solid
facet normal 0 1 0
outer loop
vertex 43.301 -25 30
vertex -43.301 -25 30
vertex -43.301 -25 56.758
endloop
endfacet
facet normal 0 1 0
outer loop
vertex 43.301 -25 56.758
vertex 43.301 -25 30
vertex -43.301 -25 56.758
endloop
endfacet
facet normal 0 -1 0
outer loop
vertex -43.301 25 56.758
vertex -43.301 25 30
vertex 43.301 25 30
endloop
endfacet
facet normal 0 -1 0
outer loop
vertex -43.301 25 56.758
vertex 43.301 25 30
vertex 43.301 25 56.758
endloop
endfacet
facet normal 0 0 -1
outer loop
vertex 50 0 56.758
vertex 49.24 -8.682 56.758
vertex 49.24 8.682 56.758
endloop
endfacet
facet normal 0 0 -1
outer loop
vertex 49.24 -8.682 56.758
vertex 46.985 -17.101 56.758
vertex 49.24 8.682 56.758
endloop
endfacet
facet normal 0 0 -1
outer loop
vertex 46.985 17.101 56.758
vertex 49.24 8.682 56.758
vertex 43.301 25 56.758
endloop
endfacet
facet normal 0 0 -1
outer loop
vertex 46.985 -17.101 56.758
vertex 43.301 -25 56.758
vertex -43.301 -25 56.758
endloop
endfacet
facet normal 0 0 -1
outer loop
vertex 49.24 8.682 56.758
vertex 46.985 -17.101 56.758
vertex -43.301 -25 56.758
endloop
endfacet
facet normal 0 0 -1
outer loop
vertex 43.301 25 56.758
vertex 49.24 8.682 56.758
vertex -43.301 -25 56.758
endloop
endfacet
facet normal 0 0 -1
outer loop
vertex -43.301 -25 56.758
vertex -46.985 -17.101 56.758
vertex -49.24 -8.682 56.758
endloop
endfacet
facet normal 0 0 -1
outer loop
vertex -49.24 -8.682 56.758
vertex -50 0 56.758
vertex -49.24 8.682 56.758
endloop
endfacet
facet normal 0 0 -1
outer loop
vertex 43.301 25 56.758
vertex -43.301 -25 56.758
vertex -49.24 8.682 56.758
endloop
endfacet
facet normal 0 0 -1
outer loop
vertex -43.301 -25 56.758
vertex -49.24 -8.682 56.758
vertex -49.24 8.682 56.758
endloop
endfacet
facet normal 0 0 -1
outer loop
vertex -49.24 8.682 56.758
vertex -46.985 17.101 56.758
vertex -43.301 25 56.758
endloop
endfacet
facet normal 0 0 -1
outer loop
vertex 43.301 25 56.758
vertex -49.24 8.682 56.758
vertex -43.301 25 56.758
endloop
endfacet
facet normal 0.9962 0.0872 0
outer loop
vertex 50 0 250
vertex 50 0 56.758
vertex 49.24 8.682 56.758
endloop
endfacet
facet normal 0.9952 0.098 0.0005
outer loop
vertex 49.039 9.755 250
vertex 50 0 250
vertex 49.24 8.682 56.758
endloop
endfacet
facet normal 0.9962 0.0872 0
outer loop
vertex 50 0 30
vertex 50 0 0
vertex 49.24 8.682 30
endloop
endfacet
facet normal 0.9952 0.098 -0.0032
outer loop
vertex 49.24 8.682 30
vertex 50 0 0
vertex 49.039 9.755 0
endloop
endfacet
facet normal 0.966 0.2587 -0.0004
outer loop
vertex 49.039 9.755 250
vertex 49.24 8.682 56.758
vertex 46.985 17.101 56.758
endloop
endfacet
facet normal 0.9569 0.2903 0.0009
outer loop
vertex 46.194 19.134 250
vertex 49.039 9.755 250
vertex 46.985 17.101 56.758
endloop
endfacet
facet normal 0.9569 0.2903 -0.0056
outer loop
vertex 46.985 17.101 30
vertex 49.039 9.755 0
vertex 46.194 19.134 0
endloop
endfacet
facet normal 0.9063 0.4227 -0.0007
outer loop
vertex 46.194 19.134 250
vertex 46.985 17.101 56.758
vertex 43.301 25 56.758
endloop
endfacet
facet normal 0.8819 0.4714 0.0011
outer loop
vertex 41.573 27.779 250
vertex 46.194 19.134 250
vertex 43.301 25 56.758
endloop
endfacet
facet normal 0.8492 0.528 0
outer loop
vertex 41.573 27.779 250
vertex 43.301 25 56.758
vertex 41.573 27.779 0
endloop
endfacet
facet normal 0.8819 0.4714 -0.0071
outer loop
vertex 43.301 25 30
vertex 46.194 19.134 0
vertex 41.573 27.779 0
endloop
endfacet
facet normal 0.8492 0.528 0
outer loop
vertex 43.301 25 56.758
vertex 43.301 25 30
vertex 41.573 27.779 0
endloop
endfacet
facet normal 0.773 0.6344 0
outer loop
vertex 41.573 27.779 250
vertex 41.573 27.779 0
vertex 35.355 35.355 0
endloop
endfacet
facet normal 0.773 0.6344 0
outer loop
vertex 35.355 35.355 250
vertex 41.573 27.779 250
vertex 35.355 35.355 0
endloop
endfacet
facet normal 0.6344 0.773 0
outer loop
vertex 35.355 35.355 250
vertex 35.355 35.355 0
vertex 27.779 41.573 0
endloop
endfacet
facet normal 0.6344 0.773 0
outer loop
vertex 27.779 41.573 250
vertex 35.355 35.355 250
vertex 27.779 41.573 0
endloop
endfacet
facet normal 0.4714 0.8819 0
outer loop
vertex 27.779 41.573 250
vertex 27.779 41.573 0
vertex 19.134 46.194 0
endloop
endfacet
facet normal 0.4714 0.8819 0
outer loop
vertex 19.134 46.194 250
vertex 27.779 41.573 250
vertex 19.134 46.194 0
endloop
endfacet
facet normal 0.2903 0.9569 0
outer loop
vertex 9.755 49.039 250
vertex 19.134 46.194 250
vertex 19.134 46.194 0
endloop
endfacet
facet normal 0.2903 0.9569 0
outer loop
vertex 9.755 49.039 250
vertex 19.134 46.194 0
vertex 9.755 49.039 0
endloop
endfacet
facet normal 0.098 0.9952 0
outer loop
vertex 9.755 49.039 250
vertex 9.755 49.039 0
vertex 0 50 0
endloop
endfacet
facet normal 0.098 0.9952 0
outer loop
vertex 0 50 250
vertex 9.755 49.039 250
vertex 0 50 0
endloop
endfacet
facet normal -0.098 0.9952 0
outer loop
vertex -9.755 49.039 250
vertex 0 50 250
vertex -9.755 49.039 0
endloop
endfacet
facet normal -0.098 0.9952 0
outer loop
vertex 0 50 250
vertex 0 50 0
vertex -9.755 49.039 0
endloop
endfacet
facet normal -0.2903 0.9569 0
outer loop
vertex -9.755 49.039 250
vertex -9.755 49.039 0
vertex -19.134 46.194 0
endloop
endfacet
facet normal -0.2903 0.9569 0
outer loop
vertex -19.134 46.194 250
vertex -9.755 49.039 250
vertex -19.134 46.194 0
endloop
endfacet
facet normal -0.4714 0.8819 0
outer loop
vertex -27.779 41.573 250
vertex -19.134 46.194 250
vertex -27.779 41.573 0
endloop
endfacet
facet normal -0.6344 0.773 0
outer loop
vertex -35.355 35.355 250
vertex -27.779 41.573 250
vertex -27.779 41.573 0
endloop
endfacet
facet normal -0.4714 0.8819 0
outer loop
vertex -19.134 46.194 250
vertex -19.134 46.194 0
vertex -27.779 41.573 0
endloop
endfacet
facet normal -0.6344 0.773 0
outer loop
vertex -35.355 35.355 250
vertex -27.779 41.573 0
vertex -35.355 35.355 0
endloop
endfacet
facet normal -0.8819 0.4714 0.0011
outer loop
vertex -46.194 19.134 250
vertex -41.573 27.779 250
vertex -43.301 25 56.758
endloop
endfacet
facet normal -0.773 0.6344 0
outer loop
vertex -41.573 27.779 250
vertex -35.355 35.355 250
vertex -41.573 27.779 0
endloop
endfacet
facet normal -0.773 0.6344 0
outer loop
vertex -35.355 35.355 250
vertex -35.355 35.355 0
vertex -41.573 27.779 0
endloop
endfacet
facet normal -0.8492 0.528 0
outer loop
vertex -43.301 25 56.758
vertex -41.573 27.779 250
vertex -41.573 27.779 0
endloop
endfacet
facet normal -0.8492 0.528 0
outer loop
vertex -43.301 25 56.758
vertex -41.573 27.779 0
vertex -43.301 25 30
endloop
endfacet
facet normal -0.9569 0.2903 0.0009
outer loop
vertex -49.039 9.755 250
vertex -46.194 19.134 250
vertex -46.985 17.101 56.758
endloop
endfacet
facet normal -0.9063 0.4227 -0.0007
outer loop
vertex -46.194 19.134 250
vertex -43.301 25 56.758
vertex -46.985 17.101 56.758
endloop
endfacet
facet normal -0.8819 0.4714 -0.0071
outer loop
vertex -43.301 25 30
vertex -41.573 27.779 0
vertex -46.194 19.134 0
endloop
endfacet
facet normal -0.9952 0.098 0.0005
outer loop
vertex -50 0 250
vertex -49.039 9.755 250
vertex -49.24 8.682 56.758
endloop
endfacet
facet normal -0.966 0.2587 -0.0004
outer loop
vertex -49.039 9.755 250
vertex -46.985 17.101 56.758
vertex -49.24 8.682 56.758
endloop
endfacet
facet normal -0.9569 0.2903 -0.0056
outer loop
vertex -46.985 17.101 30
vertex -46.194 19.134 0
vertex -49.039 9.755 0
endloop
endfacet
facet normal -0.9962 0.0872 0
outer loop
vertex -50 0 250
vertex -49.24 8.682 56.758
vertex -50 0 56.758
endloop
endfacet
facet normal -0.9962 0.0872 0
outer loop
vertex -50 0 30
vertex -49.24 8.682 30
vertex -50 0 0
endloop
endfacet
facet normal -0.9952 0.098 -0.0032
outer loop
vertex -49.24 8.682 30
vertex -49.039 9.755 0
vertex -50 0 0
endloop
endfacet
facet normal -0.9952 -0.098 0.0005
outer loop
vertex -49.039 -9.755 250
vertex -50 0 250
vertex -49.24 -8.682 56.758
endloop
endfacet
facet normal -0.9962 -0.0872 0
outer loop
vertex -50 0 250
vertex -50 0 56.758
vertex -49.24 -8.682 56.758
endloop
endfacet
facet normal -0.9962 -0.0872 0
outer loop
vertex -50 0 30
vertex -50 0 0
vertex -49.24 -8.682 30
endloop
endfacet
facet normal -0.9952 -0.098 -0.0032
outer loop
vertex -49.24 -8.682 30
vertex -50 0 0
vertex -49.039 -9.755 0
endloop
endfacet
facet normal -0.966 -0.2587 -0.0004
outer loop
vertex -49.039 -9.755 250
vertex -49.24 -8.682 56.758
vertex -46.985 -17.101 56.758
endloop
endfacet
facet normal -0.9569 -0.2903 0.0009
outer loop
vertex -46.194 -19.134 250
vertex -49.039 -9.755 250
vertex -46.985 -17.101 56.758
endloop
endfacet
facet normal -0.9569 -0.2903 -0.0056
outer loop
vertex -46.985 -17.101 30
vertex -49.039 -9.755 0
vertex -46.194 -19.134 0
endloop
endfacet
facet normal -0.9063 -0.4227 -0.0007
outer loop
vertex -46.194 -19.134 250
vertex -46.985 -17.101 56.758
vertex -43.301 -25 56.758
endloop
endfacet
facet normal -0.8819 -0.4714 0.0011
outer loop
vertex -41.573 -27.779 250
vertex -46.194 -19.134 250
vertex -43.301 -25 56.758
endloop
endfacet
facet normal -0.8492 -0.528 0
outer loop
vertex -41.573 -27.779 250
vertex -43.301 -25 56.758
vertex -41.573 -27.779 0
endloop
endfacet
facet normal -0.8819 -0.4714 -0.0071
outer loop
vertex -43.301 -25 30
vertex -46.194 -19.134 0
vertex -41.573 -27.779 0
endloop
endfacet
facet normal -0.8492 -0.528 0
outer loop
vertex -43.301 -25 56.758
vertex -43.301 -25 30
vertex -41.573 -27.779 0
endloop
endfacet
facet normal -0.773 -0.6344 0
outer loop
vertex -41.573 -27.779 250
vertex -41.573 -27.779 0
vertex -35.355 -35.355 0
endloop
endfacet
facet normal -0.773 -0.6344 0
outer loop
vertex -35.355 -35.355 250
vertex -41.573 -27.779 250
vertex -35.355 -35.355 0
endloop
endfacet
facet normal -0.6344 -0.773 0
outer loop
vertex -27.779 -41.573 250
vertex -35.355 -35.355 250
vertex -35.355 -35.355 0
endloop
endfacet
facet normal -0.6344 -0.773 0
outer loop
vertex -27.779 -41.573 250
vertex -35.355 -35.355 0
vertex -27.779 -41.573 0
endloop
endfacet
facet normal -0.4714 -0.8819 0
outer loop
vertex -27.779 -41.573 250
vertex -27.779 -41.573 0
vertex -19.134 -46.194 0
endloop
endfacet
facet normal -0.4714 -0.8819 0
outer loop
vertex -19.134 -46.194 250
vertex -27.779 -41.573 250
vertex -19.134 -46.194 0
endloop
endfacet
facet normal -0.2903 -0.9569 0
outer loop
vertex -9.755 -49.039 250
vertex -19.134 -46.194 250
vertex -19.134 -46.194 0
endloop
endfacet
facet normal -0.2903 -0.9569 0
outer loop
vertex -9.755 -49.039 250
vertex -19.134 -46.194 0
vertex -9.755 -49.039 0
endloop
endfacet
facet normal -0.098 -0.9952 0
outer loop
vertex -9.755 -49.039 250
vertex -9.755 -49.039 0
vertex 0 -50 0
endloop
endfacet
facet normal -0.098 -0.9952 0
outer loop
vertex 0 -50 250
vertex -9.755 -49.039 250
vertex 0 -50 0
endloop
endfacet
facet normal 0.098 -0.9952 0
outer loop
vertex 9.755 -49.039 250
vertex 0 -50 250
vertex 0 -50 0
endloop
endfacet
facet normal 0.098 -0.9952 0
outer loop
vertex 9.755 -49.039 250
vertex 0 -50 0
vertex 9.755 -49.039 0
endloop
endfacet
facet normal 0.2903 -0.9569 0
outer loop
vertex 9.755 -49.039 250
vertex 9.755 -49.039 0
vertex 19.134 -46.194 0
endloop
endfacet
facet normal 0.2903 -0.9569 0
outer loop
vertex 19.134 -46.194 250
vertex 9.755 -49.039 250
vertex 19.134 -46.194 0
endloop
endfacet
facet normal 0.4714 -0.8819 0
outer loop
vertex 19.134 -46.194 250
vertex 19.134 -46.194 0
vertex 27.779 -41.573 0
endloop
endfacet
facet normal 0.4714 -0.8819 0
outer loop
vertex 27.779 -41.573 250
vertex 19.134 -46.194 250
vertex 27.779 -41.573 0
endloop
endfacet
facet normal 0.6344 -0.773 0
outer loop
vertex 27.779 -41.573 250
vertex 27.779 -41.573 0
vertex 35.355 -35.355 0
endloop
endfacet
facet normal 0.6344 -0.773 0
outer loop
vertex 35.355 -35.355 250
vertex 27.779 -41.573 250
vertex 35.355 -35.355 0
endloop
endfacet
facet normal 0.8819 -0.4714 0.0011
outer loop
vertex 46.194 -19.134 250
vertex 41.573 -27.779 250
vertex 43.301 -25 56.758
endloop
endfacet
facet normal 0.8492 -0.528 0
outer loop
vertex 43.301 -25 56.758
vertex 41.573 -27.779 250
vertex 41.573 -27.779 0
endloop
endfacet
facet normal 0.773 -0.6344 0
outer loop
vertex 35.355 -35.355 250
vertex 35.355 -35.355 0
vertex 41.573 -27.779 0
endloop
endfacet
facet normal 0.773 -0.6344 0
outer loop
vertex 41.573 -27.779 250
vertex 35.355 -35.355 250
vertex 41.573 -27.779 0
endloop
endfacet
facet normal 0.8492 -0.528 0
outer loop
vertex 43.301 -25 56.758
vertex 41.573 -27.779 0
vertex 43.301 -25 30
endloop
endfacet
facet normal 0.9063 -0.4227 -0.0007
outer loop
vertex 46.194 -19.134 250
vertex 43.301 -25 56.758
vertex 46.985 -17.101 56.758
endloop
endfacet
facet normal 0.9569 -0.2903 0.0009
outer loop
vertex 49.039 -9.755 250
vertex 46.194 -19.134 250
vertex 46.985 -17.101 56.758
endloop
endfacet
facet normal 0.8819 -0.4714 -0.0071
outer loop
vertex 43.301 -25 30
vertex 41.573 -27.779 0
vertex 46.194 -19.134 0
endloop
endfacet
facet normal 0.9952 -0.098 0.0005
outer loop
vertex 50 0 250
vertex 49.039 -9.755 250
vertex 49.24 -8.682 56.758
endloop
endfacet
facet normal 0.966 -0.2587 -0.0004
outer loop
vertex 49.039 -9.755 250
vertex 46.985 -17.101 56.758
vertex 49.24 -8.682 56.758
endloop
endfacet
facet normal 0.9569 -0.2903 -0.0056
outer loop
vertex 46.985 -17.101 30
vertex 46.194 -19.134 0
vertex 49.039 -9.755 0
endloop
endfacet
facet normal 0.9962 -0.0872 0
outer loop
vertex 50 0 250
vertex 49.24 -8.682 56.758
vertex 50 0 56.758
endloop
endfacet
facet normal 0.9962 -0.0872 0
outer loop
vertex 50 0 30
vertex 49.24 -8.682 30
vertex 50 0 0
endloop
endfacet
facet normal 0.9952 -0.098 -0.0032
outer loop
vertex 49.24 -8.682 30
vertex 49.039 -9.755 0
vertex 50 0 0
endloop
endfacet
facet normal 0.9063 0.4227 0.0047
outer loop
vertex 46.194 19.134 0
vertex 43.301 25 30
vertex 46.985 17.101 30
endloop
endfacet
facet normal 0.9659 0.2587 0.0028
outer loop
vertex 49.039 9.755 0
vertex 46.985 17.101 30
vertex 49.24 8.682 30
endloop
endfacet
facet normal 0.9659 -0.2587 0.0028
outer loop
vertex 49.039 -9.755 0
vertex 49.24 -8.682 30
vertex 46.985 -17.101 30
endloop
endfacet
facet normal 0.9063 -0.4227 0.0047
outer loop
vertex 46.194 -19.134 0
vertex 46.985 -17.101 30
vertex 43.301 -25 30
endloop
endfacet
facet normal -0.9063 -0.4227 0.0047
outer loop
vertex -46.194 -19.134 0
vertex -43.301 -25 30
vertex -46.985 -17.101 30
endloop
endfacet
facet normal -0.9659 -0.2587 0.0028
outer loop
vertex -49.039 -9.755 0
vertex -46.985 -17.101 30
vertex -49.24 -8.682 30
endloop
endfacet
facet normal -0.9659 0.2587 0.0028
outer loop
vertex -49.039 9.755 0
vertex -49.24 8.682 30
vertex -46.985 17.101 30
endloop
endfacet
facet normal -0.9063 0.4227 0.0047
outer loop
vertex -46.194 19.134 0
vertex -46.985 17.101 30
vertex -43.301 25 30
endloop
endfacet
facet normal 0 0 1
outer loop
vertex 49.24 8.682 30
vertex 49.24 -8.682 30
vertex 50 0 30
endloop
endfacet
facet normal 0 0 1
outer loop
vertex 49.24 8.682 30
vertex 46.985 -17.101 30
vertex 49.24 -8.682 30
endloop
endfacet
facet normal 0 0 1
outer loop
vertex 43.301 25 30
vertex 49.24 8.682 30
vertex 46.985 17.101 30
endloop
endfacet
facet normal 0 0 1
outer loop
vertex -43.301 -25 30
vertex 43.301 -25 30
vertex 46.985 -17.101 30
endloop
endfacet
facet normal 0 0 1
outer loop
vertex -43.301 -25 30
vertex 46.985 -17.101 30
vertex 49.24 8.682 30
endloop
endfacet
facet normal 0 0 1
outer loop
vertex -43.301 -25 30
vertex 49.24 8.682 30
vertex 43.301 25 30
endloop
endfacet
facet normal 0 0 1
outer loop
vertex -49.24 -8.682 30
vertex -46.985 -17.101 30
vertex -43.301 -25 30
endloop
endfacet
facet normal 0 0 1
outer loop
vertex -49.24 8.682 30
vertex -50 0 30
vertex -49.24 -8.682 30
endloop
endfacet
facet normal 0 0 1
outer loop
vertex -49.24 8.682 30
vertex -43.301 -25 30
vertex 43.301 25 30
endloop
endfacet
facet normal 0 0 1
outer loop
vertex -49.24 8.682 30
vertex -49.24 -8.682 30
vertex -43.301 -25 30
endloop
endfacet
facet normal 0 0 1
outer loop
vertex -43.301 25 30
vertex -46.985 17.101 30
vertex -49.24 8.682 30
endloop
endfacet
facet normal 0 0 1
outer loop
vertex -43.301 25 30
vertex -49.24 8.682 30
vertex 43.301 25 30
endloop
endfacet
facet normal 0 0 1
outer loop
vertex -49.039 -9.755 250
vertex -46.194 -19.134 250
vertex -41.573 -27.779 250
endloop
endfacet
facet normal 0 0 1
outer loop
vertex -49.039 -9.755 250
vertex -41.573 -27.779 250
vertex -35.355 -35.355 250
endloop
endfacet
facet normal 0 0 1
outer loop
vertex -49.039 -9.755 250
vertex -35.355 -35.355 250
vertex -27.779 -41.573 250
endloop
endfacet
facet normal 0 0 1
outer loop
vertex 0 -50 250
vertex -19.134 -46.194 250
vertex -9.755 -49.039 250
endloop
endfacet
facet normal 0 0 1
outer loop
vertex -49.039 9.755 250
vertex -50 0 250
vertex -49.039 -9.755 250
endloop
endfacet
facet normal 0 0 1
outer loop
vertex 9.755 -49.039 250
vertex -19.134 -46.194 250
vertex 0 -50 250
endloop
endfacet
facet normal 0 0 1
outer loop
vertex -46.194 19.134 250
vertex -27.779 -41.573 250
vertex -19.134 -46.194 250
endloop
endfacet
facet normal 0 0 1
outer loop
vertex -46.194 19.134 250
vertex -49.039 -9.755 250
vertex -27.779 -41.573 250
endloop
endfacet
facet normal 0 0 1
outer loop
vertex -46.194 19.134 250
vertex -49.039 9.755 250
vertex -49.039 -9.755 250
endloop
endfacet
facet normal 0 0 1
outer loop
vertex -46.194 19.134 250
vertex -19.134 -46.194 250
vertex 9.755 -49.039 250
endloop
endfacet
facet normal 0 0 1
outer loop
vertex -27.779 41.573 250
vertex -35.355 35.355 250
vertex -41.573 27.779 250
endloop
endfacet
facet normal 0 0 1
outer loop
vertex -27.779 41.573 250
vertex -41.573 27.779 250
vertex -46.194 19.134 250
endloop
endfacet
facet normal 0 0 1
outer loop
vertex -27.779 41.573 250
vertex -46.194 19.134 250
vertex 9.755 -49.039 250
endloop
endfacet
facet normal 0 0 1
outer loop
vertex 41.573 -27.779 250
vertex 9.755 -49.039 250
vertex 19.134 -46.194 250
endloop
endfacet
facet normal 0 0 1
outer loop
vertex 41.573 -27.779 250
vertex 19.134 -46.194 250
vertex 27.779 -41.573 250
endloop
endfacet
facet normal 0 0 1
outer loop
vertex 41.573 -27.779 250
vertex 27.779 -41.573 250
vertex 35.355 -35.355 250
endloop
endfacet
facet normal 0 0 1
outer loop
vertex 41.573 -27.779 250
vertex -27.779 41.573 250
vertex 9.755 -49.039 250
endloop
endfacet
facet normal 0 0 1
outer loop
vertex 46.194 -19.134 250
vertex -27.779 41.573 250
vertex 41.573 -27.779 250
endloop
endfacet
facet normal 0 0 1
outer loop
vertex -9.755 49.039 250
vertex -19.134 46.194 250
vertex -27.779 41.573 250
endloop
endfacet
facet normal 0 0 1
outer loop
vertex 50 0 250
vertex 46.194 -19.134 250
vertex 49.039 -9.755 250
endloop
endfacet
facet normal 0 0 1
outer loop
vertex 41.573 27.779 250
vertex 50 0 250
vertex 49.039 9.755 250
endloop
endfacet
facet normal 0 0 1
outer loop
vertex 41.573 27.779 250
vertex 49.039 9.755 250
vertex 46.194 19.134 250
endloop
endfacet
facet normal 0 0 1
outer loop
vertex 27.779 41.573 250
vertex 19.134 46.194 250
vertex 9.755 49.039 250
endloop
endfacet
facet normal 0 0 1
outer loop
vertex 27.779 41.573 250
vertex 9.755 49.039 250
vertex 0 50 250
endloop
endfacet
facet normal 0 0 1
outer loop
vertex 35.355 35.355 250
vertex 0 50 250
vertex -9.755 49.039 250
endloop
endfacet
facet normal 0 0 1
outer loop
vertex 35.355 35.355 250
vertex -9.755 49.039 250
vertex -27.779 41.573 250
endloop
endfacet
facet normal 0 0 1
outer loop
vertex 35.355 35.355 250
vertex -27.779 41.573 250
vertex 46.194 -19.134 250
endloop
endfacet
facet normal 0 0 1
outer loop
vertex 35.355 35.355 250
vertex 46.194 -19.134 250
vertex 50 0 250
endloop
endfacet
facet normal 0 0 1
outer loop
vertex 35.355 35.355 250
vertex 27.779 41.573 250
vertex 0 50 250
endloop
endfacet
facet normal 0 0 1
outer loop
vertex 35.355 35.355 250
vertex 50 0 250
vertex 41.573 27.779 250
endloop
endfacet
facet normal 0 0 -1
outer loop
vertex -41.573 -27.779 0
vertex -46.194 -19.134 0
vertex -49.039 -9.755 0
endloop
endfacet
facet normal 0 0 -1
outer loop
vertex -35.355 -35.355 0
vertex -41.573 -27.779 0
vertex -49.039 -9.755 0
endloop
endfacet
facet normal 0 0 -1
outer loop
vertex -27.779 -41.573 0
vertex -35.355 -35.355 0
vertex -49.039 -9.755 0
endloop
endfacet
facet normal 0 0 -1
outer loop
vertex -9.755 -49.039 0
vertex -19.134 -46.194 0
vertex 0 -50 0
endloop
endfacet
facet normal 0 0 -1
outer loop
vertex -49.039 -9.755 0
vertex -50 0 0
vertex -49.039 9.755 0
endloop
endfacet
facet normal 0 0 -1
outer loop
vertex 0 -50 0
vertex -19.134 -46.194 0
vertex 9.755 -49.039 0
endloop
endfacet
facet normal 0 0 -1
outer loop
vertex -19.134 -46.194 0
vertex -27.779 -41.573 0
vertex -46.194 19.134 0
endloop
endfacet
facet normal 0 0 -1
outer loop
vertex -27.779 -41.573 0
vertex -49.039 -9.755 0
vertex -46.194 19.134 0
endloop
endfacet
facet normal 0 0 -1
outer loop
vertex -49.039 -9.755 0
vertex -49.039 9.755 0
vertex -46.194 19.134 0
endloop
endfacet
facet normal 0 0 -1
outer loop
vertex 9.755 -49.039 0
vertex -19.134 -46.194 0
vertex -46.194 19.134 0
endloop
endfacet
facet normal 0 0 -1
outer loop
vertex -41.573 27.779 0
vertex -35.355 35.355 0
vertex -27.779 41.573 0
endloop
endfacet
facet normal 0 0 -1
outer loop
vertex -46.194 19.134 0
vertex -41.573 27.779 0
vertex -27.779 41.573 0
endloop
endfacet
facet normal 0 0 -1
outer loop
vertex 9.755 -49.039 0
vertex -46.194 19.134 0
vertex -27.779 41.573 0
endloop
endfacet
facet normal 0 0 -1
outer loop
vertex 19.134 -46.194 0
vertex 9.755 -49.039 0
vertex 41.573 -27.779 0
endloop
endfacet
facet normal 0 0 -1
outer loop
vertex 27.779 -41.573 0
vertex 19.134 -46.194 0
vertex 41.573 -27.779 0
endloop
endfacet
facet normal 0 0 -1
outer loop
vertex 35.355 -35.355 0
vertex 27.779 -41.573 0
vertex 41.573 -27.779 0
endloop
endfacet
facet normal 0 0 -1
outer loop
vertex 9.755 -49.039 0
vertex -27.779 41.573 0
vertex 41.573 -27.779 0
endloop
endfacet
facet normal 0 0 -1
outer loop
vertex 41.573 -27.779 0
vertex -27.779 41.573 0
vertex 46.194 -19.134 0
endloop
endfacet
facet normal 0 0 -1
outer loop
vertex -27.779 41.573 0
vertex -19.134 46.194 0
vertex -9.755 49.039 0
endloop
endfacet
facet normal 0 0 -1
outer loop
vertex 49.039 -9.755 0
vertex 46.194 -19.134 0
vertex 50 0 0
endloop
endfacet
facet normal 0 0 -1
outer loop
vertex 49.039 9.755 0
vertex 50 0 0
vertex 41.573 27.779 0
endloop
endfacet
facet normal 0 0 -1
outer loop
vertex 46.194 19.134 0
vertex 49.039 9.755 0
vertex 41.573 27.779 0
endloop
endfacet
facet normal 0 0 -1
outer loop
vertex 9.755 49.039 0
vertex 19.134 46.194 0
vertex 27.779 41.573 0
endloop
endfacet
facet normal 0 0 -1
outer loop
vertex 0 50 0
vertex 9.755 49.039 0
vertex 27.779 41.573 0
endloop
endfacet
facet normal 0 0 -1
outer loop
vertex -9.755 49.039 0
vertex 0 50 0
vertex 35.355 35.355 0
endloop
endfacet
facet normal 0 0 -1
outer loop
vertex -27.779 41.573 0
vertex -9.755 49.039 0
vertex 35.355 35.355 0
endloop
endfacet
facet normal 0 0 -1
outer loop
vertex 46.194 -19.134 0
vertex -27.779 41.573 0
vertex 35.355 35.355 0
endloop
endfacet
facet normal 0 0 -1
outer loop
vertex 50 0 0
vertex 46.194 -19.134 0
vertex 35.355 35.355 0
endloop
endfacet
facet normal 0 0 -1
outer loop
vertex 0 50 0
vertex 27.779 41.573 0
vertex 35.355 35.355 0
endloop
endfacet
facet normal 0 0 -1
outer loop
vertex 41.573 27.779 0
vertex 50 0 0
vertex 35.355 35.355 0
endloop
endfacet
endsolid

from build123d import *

# Parameters (mm, degrees)
F0_R          = 50
F1_DEPTH      = 250
F2_W          = 50
F2_H          = 26.758289
F3_DEPTH      = 50
F3_DEPTH_BACK = 50


with BuildPart() as f1:
    # F0 (on Top) → F1 (new body)
    with BuildSketch(Plane.XY):
        Circle(F0_R)
    extrude(amount=F1_DEPTH)

    # F2 (on Right) → F3 (cut, two sides)
    with BuildSketch(Plane.YZ) as f3_sk:
        with Locations((0, 43.379144)):
            Rectangle(F2_W, F2_H)
    extrude(amount=F3_DEPTH, mode=Mode.SUBTRACT)
    extrude(f3_sk.sketch, amount=-F3_DEPTH_BACK, mode=Mode.SUBTRACT)


solid = f1.part
